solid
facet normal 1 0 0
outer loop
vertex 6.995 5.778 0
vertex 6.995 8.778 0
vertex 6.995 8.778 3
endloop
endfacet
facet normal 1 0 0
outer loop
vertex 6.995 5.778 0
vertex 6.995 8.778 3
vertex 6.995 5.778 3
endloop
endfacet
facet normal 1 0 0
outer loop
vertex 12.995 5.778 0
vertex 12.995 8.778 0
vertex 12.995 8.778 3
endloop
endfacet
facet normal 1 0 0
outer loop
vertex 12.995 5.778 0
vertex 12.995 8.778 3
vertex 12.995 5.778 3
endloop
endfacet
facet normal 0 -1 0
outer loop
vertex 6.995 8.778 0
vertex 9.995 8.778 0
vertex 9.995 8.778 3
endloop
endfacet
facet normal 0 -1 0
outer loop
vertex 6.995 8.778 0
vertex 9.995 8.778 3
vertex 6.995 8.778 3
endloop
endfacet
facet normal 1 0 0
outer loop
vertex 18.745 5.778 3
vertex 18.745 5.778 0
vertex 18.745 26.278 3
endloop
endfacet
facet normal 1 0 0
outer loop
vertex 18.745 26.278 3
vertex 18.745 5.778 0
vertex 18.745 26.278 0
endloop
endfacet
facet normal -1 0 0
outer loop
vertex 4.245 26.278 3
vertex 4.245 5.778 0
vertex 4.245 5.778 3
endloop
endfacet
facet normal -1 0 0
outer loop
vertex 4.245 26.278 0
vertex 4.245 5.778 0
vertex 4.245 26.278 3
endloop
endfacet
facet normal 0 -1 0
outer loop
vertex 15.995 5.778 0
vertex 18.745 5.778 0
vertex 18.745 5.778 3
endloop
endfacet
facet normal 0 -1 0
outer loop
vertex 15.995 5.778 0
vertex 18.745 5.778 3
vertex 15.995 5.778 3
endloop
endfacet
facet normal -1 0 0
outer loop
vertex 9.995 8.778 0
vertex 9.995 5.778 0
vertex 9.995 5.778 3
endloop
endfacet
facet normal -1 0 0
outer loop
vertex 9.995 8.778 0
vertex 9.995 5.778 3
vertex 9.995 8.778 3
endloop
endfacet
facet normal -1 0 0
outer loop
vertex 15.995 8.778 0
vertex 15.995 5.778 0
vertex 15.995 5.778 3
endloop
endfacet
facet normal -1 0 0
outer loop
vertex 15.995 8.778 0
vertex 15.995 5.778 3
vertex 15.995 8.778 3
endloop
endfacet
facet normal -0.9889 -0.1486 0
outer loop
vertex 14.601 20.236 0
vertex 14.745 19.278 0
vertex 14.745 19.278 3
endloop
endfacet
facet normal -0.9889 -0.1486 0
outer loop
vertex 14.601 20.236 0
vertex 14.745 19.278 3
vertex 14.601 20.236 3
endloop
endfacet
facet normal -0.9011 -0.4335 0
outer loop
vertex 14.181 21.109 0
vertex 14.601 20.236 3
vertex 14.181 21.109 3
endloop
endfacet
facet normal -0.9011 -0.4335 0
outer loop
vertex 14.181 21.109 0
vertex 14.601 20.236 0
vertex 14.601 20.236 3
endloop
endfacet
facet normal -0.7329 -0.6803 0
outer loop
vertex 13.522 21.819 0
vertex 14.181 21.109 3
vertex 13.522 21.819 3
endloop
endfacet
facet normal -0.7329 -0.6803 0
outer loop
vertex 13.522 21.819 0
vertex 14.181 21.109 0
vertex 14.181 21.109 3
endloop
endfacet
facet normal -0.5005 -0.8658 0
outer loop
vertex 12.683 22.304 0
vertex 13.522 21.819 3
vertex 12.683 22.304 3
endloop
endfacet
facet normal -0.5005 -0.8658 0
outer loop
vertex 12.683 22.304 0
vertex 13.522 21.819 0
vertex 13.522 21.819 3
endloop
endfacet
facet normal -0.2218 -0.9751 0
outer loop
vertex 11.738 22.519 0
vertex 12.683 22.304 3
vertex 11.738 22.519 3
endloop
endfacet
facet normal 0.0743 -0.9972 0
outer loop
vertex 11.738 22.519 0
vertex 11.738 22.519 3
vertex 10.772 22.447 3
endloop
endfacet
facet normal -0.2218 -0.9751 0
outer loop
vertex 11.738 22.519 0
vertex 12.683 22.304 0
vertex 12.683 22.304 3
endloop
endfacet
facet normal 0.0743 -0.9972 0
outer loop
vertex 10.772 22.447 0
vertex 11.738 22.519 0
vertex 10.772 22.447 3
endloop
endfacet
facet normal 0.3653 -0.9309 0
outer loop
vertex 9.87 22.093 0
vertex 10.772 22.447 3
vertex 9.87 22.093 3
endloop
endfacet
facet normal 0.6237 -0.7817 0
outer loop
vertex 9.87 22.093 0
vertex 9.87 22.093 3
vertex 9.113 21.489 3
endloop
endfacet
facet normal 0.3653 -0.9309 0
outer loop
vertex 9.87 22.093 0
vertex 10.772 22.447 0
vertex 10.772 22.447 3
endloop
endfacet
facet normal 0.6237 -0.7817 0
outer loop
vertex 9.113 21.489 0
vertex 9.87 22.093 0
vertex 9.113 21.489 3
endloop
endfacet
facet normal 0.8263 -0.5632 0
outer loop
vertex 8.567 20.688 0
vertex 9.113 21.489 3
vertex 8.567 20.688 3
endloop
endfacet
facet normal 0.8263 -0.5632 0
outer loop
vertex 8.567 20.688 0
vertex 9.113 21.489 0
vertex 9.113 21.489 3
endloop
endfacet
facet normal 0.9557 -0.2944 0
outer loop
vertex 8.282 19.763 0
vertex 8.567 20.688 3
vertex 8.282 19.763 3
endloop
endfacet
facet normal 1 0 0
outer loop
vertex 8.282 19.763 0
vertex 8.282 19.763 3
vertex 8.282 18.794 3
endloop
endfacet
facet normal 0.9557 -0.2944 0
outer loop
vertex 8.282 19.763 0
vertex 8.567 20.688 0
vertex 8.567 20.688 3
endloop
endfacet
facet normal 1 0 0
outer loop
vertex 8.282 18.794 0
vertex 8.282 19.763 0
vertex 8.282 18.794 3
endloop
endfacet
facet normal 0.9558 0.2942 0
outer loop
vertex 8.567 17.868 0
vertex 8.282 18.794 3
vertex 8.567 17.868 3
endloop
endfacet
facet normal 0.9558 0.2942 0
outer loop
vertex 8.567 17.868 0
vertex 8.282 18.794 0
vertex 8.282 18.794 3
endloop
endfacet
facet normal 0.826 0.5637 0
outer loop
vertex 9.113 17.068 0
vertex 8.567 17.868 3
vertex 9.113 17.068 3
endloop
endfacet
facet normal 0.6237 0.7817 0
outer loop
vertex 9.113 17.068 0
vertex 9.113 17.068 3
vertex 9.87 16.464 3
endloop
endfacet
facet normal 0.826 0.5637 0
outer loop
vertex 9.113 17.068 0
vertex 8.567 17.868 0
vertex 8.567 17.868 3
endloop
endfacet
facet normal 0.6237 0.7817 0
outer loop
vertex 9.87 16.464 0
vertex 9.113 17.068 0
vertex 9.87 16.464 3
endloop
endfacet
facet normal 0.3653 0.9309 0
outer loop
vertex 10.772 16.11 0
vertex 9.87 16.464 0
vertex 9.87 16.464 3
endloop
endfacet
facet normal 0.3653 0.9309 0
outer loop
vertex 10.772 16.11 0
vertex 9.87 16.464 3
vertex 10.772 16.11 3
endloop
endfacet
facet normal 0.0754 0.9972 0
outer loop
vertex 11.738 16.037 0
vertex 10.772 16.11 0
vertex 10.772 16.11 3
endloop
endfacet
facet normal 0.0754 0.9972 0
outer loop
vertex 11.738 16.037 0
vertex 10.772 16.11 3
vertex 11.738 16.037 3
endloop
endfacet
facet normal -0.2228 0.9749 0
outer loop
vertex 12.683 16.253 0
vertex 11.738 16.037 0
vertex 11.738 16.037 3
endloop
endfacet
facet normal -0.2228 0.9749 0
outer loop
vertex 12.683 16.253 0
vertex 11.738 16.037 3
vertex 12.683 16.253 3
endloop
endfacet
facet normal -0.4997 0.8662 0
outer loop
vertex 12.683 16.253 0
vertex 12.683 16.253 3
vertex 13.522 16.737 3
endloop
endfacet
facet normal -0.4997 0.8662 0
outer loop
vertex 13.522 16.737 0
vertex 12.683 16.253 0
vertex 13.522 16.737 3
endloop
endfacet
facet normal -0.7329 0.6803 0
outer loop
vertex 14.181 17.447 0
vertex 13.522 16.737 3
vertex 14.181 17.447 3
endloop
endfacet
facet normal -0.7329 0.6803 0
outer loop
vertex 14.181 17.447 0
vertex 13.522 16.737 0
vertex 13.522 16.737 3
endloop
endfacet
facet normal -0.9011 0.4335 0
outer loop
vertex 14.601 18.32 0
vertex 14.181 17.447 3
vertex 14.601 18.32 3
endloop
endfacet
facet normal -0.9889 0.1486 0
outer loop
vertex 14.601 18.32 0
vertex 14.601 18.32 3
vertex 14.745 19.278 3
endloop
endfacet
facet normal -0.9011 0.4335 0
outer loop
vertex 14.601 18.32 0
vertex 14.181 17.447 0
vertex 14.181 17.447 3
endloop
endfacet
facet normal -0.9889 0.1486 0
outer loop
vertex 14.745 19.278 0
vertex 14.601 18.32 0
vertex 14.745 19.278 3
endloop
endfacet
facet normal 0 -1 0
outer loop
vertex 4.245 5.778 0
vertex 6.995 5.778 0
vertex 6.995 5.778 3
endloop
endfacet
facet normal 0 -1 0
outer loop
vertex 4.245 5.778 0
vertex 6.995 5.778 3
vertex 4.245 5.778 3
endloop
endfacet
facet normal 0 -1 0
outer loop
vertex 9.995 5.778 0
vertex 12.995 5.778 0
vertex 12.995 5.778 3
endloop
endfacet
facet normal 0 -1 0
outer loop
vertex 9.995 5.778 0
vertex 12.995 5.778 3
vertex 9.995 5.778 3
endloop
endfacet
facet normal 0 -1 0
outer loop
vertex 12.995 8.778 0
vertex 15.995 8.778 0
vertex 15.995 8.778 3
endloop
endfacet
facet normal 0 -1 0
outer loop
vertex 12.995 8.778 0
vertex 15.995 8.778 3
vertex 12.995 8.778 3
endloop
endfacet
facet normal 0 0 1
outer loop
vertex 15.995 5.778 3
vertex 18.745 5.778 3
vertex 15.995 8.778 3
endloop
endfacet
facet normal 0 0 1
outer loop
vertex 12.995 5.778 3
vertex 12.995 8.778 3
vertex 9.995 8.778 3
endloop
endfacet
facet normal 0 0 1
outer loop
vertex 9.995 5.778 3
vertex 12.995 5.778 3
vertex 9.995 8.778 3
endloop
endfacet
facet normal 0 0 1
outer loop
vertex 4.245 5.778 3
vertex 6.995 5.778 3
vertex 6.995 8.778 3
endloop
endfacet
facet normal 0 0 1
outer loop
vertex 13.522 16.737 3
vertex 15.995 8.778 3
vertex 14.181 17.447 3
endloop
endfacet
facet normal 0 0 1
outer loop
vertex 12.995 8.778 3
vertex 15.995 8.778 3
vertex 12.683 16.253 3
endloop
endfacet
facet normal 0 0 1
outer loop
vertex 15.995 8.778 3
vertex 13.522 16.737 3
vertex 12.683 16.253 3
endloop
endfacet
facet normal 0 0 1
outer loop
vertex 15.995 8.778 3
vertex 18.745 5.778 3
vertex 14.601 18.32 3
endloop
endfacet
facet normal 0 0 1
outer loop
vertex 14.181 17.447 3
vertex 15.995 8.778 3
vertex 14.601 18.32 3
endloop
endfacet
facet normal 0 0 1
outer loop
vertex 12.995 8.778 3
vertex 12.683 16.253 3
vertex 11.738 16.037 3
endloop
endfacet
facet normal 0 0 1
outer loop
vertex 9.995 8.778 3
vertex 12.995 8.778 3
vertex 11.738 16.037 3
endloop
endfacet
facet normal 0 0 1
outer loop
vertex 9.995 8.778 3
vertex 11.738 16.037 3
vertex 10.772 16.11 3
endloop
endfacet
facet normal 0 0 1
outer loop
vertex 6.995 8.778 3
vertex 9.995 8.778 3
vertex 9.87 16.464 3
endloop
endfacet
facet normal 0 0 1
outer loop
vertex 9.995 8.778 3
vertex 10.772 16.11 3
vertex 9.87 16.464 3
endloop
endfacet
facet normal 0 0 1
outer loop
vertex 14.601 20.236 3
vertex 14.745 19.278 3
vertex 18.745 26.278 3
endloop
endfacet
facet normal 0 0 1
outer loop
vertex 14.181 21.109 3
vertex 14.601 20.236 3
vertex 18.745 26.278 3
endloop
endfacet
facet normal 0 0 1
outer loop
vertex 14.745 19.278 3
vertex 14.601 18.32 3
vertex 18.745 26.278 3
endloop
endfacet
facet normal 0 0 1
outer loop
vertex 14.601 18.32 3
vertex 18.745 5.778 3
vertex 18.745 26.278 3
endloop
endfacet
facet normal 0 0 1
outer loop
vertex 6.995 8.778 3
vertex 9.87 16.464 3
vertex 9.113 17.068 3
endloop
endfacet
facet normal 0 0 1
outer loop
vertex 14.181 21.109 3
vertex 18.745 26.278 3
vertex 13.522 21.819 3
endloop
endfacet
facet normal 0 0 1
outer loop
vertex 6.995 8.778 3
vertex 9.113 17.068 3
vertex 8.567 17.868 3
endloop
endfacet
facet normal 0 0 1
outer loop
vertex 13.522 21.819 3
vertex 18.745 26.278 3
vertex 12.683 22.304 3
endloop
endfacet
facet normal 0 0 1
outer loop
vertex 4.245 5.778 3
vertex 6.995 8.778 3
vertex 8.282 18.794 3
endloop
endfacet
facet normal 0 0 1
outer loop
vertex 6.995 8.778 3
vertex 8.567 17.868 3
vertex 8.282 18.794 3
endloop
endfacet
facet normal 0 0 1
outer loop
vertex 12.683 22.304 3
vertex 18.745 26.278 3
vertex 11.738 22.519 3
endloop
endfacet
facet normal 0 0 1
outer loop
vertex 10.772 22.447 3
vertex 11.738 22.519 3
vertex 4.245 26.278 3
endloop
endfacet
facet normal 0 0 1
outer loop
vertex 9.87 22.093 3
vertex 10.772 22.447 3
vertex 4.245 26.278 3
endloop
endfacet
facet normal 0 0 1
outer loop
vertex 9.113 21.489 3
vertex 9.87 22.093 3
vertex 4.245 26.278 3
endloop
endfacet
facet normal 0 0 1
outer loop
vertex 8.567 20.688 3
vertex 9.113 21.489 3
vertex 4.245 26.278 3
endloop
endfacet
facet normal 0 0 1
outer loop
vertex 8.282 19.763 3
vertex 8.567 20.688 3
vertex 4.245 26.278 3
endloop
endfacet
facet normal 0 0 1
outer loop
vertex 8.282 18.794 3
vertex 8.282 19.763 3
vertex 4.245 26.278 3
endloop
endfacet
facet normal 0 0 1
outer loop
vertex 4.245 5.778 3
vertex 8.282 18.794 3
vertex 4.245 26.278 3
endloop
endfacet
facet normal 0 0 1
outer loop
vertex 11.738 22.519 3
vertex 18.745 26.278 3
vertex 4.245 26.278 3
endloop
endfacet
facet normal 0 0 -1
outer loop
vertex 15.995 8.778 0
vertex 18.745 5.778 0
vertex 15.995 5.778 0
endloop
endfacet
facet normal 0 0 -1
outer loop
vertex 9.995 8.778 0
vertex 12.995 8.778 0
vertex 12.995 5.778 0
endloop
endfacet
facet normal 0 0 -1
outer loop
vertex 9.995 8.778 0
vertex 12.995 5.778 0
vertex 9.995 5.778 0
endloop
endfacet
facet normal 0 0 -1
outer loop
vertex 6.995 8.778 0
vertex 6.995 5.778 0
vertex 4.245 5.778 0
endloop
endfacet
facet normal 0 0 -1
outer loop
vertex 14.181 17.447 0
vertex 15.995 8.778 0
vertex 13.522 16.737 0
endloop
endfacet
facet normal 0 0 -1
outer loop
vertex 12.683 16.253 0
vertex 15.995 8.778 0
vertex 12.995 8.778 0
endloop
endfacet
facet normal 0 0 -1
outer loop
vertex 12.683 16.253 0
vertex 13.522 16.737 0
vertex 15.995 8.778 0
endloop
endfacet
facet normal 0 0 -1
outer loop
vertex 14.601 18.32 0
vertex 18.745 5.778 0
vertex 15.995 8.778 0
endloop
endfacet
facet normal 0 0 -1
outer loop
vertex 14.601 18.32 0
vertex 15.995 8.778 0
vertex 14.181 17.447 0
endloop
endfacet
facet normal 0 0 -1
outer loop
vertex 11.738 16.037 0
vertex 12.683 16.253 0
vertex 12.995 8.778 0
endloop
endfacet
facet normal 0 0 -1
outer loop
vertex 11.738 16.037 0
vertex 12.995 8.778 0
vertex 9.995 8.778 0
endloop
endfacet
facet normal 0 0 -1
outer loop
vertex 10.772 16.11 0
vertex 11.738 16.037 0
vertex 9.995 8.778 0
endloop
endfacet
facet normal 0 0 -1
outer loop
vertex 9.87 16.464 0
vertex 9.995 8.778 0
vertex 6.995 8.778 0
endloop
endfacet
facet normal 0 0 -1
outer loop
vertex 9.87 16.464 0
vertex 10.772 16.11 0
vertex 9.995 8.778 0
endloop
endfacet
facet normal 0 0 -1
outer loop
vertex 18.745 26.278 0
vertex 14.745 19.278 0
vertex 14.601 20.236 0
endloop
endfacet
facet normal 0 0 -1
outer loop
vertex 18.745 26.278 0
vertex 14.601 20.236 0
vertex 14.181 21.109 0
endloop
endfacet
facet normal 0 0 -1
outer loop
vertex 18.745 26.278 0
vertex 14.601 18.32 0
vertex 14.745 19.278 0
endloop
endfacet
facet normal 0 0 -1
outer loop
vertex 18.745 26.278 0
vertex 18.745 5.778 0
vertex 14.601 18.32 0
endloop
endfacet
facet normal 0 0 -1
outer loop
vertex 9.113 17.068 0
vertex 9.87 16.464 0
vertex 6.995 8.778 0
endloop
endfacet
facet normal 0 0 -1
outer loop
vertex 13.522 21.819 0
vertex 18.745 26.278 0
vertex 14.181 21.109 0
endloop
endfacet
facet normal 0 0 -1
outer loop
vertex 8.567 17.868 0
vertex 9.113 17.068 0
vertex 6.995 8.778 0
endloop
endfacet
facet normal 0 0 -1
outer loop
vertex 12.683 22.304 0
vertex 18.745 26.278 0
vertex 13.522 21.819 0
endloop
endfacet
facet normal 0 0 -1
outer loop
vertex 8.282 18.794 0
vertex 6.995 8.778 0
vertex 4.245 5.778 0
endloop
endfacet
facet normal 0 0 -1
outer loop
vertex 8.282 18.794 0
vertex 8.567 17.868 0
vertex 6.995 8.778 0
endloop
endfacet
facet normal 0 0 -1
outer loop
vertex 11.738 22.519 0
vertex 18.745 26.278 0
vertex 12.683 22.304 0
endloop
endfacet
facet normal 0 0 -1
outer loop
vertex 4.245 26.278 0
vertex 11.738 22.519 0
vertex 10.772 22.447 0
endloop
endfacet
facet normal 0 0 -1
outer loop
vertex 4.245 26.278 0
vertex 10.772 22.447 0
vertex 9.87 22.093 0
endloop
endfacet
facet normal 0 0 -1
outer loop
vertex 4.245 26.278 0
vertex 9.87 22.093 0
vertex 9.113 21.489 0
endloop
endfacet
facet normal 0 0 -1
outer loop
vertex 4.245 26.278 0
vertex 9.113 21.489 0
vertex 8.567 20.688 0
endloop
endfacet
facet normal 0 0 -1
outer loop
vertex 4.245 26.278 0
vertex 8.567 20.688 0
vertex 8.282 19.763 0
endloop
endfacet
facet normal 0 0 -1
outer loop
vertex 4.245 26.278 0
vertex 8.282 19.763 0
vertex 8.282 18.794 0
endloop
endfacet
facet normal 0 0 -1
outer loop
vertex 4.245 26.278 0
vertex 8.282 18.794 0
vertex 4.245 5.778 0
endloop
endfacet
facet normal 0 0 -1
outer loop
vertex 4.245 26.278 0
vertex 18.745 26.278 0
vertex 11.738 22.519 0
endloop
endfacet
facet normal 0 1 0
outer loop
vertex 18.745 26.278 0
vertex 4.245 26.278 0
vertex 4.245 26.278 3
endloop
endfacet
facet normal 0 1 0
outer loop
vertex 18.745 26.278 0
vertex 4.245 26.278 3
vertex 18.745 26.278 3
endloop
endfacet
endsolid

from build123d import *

# Parameters (mm, degrees)
SKETCH1_R           = 3.25
BOSS_EXTRUDE1_DEPTH = 3


with BuildPart() as part:
    # Sketch1 → Boss-Extrude1 (new body)
    with BuildSketch(Plane.XY):
        Polygon((4.245252181, 5.778256787), (4.245252181, 26.278256787), (18.745252181, 26.278256787), (18.745252181, 5.969156991), (18.745252181, 5.778256787), (15.995252181, 5.778256787), (15.995252181, 8.778256787), (12.995252181, 8.778256787), (12.995252181, 5.778256787), (9.995252181, 5.778256787), (9.995252181, 8.778256787), (6.995252181, 8.778256787), (6.995252181, 5.778256787), align=None)
        with Locations((11.495252181, 19.278256787)):
            Circle(SKETCH1_R, mode=Mode.SUBTRACT)
    extrude(amount=BOSS_EXTRUDE1_DEPTH)


solid = part.part
